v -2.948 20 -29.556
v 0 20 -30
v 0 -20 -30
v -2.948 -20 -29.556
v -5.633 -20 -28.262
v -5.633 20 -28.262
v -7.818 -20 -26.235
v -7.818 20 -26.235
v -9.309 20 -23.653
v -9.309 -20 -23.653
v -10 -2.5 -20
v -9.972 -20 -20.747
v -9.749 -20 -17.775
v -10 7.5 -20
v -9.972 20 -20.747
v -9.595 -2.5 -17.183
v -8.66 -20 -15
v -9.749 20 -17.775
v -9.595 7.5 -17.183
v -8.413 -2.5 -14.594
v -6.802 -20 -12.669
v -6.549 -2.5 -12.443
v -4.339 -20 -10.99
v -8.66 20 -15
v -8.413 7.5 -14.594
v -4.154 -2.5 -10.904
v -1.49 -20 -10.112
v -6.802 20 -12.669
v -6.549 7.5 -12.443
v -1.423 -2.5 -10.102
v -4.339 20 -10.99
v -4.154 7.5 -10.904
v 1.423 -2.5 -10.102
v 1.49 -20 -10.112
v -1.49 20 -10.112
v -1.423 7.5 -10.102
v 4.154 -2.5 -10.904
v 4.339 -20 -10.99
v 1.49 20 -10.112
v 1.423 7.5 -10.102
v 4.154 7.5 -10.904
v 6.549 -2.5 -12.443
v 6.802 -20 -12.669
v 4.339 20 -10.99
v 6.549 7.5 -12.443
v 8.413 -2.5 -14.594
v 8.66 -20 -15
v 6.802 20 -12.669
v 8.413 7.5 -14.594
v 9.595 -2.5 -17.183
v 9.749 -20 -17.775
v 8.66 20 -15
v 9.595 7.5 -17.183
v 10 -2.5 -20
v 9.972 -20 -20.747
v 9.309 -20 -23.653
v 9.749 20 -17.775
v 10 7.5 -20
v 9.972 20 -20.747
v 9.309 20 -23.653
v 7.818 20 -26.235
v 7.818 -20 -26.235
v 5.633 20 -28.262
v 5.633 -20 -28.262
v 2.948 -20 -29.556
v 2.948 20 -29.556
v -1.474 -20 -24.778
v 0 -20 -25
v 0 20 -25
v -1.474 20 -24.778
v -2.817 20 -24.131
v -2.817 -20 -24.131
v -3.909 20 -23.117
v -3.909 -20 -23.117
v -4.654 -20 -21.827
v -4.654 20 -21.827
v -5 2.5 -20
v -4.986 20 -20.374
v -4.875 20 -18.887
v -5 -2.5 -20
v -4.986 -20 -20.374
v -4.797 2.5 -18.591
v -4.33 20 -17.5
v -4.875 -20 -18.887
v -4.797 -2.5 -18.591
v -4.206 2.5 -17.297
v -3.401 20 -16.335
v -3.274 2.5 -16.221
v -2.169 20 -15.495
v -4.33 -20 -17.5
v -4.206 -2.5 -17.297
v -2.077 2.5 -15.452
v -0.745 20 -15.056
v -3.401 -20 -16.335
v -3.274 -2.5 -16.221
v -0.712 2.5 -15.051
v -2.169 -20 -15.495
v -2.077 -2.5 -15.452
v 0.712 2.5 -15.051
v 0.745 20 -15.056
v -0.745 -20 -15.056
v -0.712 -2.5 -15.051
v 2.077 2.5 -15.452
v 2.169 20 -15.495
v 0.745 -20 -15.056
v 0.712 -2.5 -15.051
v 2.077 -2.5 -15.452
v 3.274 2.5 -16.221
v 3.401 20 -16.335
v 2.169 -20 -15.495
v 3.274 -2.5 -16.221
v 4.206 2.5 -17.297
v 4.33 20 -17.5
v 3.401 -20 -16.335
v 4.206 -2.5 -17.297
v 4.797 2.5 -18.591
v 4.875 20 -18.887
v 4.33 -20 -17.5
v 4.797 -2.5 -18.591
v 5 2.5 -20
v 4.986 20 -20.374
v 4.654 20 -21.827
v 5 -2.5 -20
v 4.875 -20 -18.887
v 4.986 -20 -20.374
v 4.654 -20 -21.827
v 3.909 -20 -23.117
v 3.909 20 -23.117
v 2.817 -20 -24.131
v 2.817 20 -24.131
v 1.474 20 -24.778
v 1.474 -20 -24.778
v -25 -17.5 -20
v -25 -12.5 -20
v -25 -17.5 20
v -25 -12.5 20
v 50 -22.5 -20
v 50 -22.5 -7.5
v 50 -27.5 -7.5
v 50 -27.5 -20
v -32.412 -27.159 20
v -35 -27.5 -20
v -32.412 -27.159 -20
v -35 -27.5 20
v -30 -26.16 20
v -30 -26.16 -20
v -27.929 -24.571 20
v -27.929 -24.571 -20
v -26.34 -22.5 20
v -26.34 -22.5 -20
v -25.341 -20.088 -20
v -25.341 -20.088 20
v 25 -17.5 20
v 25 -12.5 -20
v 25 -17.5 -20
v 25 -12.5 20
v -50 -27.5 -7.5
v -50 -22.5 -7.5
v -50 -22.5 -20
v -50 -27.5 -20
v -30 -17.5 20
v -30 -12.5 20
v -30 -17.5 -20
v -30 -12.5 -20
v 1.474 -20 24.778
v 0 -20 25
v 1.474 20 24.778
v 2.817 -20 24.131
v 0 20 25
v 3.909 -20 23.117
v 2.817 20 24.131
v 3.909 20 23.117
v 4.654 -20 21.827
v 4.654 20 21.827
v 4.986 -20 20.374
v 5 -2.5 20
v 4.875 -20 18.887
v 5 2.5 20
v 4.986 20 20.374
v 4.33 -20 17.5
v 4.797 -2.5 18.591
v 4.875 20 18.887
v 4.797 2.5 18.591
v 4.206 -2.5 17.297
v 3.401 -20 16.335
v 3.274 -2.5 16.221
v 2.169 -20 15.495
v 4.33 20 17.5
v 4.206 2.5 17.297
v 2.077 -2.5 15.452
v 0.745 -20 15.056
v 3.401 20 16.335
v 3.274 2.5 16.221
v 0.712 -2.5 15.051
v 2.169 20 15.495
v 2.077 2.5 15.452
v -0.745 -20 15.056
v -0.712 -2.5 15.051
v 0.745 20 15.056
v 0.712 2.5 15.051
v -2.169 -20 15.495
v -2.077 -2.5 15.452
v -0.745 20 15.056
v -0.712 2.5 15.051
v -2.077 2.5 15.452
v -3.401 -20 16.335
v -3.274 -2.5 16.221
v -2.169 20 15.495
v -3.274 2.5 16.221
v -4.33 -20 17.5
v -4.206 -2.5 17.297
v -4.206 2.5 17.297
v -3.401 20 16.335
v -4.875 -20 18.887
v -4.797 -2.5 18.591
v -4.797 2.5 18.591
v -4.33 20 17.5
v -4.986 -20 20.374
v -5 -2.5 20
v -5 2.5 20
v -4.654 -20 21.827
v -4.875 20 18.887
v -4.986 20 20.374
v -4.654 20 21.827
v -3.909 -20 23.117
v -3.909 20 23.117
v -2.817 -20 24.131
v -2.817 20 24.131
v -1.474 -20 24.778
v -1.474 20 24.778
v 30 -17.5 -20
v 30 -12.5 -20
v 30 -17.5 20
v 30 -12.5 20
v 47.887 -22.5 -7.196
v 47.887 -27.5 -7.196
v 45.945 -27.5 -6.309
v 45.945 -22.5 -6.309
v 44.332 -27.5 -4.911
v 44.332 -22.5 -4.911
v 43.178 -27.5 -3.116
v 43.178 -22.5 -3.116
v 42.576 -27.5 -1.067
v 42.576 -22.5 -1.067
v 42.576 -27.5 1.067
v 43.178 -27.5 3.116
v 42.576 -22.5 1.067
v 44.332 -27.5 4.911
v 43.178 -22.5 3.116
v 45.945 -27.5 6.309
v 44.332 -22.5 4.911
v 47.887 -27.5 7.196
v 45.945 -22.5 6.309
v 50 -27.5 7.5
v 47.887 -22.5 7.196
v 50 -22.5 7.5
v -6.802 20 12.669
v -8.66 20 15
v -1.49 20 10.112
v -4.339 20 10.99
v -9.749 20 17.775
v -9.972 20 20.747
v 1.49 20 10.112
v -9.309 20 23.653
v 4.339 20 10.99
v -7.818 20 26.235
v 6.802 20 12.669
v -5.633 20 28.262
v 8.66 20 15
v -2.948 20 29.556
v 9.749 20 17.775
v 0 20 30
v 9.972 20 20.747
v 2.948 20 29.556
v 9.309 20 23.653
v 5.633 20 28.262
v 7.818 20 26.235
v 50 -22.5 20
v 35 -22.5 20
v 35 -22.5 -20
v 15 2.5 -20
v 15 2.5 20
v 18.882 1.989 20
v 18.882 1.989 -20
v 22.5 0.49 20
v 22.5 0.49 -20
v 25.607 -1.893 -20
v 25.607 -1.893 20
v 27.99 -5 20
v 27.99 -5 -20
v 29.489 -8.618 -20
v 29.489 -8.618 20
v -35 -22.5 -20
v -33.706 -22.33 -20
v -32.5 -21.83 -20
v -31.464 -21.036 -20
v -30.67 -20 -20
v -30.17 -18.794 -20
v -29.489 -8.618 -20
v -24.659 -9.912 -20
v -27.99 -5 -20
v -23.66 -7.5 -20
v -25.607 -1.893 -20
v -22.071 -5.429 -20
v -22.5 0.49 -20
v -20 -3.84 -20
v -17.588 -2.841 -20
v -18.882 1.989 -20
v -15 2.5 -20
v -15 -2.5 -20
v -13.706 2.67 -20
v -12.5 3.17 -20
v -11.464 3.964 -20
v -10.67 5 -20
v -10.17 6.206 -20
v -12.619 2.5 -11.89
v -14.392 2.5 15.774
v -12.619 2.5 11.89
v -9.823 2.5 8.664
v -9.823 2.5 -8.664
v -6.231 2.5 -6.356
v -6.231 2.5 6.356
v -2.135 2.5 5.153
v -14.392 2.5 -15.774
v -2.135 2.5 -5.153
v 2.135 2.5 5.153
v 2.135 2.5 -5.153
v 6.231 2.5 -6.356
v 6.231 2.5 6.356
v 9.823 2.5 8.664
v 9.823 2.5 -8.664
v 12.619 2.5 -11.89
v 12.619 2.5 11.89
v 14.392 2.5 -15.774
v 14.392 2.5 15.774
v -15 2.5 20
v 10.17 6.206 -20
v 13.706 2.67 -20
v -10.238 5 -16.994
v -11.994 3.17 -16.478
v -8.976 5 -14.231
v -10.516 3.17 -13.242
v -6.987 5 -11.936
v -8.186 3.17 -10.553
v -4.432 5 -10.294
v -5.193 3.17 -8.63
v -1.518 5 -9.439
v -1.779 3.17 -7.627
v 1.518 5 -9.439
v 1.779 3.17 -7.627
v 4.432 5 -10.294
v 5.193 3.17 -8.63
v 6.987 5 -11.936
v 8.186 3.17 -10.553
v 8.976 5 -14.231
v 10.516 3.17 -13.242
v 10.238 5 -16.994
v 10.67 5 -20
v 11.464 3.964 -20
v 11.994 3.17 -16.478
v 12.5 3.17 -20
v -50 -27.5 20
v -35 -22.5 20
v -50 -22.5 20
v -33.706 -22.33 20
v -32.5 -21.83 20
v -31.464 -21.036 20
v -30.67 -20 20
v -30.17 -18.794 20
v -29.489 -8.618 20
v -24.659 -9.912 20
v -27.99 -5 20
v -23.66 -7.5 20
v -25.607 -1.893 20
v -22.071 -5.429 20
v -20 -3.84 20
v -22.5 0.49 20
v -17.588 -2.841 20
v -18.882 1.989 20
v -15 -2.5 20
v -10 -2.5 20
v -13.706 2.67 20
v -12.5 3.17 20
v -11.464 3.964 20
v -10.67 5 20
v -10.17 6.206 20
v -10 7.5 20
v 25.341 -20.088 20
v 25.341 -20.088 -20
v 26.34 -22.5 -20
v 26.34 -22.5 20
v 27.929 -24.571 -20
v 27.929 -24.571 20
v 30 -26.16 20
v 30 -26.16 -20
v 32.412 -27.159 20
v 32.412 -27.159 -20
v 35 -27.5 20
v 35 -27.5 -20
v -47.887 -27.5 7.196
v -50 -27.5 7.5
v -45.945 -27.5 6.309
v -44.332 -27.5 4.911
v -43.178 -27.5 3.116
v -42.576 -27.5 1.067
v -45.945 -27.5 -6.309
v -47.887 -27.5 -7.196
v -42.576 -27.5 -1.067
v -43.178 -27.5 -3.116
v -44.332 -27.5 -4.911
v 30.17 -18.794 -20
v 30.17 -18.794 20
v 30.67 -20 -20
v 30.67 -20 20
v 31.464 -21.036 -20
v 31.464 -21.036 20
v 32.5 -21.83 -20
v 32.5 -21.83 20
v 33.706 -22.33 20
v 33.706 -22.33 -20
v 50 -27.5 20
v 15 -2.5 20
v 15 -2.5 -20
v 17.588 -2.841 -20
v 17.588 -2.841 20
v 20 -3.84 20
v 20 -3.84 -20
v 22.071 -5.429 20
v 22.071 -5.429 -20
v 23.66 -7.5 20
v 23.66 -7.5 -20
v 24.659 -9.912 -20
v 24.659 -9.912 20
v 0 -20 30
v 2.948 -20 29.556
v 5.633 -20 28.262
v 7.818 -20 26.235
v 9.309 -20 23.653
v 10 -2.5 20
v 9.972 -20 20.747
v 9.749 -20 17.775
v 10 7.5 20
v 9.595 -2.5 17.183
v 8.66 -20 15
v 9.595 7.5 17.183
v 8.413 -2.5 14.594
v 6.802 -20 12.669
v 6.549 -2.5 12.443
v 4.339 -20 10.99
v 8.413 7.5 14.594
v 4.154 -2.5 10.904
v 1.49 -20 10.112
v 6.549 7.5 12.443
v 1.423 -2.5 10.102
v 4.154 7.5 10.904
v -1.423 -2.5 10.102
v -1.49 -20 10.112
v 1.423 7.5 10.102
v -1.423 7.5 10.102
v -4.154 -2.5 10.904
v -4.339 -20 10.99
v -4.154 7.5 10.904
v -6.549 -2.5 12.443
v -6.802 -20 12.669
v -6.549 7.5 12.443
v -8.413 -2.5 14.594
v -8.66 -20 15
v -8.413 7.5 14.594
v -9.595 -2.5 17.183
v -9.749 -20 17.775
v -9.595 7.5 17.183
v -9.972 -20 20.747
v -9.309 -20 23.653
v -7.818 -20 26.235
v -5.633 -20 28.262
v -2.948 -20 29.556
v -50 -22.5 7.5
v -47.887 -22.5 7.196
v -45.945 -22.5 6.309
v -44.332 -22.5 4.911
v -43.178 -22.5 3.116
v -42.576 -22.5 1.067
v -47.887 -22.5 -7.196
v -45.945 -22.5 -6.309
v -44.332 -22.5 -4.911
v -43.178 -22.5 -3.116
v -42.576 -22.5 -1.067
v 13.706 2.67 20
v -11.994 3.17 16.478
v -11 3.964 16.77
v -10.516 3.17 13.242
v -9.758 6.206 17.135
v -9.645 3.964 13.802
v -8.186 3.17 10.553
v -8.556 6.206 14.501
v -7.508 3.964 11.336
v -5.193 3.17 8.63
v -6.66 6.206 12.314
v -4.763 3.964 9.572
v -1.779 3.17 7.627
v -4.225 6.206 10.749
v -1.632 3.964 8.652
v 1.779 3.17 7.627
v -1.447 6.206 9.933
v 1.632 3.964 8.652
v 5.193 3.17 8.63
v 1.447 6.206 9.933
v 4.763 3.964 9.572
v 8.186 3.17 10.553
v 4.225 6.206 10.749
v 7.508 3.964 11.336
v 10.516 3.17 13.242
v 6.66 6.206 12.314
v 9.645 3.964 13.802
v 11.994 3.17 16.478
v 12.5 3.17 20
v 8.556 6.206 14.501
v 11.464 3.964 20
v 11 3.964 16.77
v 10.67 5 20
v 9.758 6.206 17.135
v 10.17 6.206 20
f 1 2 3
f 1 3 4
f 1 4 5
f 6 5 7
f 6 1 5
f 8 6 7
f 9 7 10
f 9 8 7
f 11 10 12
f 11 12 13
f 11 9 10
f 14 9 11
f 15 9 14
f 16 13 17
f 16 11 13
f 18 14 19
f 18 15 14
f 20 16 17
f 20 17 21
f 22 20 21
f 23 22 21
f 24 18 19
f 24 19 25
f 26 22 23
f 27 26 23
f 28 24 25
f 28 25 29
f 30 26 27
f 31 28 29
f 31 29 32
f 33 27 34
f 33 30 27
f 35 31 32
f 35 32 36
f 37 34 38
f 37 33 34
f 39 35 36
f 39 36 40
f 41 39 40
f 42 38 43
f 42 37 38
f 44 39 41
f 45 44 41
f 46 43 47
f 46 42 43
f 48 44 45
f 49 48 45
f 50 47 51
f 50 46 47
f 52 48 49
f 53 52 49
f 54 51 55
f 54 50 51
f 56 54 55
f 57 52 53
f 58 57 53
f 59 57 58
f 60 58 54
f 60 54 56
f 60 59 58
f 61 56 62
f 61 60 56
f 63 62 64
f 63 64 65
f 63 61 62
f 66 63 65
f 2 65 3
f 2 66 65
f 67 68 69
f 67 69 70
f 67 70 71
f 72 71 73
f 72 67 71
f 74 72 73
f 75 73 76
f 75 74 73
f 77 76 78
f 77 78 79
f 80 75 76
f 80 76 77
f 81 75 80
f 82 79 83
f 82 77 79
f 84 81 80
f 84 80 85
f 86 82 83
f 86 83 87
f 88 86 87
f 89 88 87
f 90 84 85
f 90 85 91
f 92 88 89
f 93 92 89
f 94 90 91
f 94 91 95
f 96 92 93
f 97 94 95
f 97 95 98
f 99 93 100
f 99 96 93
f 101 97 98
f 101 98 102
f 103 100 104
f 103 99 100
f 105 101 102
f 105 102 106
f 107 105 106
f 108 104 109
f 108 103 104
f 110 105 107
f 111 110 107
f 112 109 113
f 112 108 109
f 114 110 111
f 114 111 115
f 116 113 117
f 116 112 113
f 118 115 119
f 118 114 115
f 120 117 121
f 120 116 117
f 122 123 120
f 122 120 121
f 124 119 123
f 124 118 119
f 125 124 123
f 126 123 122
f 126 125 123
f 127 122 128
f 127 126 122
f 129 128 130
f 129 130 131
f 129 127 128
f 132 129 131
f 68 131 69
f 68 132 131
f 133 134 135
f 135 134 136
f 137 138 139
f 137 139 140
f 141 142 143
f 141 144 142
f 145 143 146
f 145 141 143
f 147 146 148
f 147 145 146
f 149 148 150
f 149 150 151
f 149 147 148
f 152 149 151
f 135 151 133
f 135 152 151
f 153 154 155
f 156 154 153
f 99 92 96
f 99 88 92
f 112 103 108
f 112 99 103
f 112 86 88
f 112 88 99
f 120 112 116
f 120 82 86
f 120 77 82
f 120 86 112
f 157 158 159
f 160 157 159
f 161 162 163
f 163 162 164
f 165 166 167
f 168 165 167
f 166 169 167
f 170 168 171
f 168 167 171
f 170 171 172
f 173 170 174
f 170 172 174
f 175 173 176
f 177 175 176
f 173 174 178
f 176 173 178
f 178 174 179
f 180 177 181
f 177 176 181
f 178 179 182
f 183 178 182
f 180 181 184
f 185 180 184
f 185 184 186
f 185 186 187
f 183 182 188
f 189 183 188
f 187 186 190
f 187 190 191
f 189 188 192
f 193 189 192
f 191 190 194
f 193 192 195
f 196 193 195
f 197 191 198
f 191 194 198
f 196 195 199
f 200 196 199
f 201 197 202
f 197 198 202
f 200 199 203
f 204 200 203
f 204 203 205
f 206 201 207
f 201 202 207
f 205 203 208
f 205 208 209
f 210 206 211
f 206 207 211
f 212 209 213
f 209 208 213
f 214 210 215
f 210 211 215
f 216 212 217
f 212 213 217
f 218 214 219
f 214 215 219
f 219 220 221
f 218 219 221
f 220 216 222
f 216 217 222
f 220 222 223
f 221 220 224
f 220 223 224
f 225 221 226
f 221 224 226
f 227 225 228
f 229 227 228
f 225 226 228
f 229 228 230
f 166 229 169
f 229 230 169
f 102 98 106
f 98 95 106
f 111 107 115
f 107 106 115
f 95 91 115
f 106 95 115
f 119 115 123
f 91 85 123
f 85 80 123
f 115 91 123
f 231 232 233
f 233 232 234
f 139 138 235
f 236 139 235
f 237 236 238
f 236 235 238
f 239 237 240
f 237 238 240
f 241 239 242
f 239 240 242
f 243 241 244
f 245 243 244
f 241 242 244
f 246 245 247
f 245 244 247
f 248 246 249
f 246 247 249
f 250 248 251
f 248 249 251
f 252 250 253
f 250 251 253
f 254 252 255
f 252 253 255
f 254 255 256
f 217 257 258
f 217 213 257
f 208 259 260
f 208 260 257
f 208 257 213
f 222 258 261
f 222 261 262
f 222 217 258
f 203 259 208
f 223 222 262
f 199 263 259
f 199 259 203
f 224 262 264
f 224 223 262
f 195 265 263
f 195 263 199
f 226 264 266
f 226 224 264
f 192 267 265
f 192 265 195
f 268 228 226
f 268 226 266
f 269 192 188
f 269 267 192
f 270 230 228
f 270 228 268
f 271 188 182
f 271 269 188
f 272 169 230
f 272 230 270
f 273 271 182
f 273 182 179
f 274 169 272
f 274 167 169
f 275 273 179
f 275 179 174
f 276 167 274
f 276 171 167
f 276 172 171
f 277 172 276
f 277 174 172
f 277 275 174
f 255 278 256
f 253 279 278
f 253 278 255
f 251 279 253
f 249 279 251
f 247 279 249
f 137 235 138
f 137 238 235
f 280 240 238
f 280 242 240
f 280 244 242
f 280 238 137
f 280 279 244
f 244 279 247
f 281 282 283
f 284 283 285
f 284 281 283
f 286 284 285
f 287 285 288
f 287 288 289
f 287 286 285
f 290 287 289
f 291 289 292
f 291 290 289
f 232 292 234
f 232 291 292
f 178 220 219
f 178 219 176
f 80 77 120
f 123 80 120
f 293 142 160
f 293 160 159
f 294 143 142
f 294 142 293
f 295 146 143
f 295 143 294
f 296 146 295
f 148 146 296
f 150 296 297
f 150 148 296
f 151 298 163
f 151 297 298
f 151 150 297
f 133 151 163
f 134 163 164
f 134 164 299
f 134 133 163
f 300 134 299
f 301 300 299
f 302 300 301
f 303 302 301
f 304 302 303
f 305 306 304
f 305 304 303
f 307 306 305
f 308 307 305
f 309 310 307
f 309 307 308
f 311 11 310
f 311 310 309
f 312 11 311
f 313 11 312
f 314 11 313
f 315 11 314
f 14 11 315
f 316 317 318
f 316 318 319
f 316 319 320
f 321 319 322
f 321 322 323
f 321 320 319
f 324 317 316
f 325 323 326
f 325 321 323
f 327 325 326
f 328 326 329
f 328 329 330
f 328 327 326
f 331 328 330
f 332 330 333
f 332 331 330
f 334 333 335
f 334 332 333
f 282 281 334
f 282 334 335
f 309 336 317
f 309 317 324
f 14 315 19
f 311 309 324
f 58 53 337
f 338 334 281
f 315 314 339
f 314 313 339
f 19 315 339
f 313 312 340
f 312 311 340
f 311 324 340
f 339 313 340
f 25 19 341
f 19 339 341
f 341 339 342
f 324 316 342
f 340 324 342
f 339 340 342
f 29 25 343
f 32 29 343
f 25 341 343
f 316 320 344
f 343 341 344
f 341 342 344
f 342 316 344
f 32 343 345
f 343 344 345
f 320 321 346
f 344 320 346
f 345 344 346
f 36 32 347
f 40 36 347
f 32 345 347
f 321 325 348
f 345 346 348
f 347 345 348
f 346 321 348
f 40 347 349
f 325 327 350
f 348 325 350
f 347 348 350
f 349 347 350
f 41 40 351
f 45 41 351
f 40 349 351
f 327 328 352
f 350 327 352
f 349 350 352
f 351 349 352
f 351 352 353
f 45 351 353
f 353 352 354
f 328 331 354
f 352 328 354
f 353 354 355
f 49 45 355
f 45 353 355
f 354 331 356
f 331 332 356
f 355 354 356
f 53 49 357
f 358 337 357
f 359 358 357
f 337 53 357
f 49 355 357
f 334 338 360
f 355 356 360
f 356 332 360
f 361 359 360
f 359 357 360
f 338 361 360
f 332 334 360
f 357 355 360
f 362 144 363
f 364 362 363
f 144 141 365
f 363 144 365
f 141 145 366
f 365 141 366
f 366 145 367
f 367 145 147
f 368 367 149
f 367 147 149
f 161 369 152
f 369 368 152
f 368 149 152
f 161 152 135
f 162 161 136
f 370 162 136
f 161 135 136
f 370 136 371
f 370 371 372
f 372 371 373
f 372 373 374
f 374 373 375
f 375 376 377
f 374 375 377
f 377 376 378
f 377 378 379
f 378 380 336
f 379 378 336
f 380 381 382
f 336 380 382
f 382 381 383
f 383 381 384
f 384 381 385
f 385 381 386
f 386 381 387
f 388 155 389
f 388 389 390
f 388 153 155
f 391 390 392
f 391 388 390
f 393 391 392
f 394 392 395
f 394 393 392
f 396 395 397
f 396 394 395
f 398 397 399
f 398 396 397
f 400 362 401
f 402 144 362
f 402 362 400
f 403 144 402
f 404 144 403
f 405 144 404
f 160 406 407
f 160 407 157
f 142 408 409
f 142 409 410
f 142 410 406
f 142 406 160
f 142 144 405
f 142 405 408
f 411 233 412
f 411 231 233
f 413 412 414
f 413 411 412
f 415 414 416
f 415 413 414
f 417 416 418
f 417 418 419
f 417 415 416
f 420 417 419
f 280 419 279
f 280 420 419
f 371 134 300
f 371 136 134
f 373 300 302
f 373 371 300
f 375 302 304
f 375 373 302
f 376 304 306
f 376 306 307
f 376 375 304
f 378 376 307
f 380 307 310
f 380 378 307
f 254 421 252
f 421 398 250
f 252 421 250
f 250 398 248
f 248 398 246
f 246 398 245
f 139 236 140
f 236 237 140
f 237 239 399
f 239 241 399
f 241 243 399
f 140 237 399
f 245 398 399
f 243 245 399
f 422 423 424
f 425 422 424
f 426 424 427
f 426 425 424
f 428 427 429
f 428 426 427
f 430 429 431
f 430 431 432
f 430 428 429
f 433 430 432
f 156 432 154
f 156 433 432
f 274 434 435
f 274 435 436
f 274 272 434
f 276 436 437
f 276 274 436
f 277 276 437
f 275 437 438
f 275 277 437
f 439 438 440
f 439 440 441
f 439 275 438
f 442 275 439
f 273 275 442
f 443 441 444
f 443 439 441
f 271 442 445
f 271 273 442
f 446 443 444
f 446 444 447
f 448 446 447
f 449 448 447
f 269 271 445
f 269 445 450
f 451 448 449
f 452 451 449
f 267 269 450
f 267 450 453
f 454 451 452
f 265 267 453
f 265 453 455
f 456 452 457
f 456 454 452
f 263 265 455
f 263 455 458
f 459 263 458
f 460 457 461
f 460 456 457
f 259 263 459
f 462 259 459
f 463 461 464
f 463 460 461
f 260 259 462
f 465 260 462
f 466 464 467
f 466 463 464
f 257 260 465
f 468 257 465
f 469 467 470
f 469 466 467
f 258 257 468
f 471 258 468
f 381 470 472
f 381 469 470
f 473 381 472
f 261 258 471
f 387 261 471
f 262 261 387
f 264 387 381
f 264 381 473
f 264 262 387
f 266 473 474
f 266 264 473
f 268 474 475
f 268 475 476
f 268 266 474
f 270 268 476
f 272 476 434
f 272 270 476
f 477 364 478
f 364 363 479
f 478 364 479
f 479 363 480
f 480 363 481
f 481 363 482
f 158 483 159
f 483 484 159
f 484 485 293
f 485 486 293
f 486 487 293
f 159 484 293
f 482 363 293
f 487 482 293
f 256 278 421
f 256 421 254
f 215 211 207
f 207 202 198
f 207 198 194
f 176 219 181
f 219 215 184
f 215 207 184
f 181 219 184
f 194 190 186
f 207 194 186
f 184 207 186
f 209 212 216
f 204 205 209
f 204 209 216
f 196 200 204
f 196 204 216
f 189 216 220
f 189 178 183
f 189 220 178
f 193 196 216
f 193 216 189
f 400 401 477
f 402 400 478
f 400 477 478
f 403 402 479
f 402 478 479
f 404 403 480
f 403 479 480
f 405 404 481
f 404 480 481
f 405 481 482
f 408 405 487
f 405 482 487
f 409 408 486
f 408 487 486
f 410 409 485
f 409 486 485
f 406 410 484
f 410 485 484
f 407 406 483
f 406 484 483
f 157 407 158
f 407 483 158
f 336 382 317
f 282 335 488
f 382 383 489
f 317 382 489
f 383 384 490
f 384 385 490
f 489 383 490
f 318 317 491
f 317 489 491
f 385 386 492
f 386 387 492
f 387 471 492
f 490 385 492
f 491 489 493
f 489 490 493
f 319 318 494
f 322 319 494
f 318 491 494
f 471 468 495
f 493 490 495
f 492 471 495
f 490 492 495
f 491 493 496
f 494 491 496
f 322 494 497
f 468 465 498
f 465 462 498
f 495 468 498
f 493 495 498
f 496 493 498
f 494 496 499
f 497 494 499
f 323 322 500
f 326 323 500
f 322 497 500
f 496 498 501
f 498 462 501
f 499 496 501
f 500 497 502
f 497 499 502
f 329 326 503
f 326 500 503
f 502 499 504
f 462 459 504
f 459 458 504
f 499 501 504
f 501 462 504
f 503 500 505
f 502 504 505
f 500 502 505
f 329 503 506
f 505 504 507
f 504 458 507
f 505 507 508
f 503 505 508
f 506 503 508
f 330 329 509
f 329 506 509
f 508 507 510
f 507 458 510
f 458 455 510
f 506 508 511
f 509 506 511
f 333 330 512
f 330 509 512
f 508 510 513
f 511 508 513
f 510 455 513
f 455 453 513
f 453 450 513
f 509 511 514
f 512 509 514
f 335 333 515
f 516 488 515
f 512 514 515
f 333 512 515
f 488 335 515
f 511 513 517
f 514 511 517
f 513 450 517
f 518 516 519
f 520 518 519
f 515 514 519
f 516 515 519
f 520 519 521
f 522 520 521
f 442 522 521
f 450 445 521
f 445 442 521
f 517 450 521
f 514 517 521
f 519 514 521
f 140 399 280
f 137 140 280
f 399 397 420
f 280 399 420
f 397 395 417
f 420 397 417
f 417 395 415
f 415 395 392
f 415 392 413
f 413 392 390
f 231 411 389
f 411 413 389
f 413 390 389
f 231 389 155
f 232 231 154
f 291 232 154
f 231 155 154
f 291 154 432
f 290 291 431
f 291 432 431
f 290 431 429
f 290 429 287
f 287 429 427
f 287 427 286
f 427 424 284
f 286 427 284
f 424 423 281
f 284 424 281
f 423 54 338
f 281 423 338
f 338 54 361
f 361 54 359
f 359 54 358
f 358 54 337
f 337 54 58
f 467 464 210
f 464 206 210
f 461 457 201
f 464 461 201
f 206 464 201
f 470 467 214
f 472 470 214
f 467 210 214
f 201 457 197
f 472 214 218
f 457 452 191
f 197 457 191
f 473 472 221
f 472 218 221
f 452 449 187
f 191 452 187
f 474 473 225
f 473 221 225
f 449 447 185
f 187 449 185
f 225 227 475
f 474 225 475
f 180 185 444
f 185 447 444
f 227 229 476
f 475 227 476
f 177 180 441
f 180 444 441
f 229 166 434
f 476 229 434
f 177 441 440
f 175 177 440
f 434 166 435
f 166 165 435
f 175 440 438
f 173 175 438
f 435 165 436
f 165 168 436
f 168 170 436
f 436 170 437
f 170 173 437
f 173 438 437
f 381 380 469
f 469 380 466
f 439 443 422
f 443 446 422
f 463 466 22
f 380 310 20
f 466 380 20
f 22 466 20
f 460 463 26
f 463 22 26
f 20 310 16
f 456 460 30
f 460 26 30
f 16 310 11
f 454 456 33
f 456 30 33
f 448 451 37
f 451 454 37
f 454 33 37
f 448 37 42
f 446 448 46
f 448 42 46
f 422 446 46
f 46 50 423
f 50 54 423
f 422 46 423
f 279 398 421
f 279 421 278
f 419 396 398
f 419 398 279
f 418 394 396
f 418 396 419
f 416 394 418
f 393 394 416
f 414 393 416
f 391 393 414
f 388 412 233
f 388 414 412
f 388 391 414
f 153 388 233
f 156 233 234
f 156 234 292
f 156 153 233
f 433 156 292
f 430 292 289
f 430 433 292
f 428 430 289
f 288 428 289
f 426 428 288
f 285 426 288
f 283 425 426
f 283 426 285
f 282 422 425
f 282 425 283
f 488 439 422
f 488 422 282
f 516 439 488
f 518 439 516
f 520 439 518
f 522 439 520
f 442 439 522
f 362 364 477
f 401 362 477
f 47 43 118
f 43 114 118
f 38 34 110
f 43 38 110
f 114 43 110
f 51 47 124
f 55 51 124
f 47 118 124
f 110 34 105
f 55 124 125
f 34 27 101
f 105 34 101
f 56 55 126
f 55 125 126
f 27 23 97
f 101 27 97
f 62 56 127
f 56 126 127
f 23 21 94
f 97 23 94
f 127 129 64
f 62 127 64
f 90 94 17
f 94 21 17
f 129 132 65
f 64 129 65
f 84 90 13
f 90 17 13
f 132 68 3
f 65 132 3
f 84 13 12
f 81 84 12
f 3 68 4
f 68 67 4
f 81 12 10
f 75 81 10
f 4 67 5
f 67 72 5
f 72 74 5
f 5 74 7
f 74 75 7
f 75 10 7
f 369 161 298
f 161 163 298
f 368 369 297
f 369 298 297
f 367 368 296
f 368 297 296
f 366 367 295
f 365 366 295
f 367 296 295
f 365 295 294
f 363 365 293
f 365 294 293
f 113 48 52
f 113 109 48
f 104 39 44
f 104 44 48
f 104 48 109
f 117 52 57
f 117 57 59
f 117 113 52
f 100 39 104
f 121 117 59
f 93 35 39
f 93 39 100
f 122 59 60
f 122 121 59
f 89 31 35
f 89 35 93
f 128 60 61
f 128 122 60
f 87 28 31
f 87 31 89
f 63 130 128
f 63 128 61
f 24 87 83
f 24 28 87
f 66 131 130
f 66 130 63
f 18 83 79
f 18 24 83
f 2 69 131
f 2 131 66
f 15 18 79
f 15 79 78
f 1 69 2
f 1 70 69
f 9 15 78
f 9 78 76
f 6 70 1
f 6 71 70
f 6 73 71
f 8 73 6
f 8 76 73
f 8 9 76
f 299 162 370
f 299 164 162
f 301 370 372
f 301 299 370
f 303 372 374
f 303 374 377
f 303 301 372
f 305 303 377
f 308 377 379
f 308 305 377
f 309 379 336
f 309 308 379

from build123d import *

# Parameters (mm, degrees)
SKETCH1_W           = 60
SKETCH1_H           = 40
BOSS_EXTRUDE3_DEPTH = 2.5
SKETCH3_R           = 10
SKETCH3_R_2         = 5
BOSS_EXTRUDE4_DEPTH = 20
FILLET7_R           = 5
SKETCH4_W           = 5
SKETCH4_H           = 40
BOSS_EXTRUDE6_DEPTH = 25
SKETCH5_W           = 40
SKETCH5_H           = 5
BOSS_EXTRUDE7_DEPTH = 20
FILLET8_R           = 5
FILLET9_R           = 10
FILLET10_R          = 15
SKETCH6_R           = 7.5
CUT_EXTRUDE1_DEPTH  = 20


with BuildPart() as part:
    # Sketch1 → Boss-Extrude3 (new, symmetric)
    with BuildSketch(Plane(origin=(0, 0, 0), x_dir=(1, 0, 0), z_dir=(0, 1, 0))):
        Rectangle(SKETCH1_W, SKETCH1_H)
    extrude(amount=BOSS_EXTRUDE3_DEPTH, both=True)

    # Sketch3 → Boss-Extrude4 (add, symmetric)
    with BuildSketch(Plane(origin=(0, 0, 0), x_dir=(1, 0, 0), z_dir=(0, 1, 0))):
        with Locations(Location((0, -20, 0), (0, 0, 270))):
            Circle(SKETCH3_R)
        with Locations(Location((0, -20, 0), (0, 0, 270))):
            Circle(SKETCH3_R_2, mode=Mode.SUBTRACT)
        with Locations(Location((0, 20, 0), (0, 0, 90))):
            Circle(SKETCH3_R)
        with Locations(Location((0, 20, 0), (0, 0, 90))):
            Circle(SKETCH3_R_2, mode=Mode.SUBTRACT)
    extrude(amount=BOSS_EXTRUDE4_DEPTH, both=True)

    # Fillet7
    fillet7_edges = [part.edges().sort_by_distance(p)[0] for p in [
        (0, 2.5, 10),
        (0, 2.5, -10),
    ]]
    fillet(fillet7_edges, radius=FILLET7_R)

    # Sketch4 → Boss-Extrude6 (add)
    with BuildSketch(Plane.XZ.offset(2.5)):
        with Locations((27.5, 0)):
            Rectangle(SKETCH4_W, SKETCH4_H)
        with Locations((-27.5, 0)):
            Rectangle(SKETCH4_W, SKETCH4_H)
    extrude(amount=BOSS_EXTRUDE6_DEPTH)

    # Sketch5 → Boss-Extrude7 (add)
    with BuildSketch(Plane(origin=(30, 0, 0), x_dir=(0, 0, -1), z_dir=(1, 0, 0))):
        with Locations((0, -25)):
            Rectangle(SKETCH5_W, SKETCH5_H)
    boss_extrude7 = extrude(amount=BOSS_EXTRUDE7_DEPTH)

    # Mirror1: Boss-Extrude7 across plane
    add(boss_extrude7.mirror(Plane(origin=(0, 0, 0), x_dir=(0, 0, 1), z_dir=(1, 0, 0))))

    # Fillet8
    fillet8_edges = [part.edges().sort_by_distance(p)[0] for p in [
        (30, -22.5, 0),
        (-30, -22.5, 0),
    ]]
    fillet(fillet8_edges, radius=FILLET8_R)

    # Fillet9
    fillet9_edges = [part.edges().sort_by_distance(p)[0] for p in [
        (25, -2.5, 0),
        (25, -27.5, 0),
        (-25, -2.5, 0),
        (-25, -27.5, 0),
    ]]
    fillet(fillet9_edges, radius=FILLET9_R)

    # Fillet10
    fillet10_edges = [part.edges().sort_by_distance(p)[0] for p in [
        (30, 2.5, 0),
        (-30, 2.5, 0),
    ]]
    fillet(fillet10_edges, radius=FILLET10_R)

    # Sketch6 → Cut-Extrude1 (cut)
    with BuildSketch(Plane(origin=(0, -22.5, 0), x_dir=(1, 0, 0), z_dir=(0, 1, 0))):
        with Locations((50, 0)):
            Circle(SKETCH6_R)
        with Locations((-50, 0)):
            Circle(SKETCH6_R)
    extrude(amount=-CUT_EXTRUDE1_DEPTH, mode=Mode.SUBTRACT)


solid = part.part
